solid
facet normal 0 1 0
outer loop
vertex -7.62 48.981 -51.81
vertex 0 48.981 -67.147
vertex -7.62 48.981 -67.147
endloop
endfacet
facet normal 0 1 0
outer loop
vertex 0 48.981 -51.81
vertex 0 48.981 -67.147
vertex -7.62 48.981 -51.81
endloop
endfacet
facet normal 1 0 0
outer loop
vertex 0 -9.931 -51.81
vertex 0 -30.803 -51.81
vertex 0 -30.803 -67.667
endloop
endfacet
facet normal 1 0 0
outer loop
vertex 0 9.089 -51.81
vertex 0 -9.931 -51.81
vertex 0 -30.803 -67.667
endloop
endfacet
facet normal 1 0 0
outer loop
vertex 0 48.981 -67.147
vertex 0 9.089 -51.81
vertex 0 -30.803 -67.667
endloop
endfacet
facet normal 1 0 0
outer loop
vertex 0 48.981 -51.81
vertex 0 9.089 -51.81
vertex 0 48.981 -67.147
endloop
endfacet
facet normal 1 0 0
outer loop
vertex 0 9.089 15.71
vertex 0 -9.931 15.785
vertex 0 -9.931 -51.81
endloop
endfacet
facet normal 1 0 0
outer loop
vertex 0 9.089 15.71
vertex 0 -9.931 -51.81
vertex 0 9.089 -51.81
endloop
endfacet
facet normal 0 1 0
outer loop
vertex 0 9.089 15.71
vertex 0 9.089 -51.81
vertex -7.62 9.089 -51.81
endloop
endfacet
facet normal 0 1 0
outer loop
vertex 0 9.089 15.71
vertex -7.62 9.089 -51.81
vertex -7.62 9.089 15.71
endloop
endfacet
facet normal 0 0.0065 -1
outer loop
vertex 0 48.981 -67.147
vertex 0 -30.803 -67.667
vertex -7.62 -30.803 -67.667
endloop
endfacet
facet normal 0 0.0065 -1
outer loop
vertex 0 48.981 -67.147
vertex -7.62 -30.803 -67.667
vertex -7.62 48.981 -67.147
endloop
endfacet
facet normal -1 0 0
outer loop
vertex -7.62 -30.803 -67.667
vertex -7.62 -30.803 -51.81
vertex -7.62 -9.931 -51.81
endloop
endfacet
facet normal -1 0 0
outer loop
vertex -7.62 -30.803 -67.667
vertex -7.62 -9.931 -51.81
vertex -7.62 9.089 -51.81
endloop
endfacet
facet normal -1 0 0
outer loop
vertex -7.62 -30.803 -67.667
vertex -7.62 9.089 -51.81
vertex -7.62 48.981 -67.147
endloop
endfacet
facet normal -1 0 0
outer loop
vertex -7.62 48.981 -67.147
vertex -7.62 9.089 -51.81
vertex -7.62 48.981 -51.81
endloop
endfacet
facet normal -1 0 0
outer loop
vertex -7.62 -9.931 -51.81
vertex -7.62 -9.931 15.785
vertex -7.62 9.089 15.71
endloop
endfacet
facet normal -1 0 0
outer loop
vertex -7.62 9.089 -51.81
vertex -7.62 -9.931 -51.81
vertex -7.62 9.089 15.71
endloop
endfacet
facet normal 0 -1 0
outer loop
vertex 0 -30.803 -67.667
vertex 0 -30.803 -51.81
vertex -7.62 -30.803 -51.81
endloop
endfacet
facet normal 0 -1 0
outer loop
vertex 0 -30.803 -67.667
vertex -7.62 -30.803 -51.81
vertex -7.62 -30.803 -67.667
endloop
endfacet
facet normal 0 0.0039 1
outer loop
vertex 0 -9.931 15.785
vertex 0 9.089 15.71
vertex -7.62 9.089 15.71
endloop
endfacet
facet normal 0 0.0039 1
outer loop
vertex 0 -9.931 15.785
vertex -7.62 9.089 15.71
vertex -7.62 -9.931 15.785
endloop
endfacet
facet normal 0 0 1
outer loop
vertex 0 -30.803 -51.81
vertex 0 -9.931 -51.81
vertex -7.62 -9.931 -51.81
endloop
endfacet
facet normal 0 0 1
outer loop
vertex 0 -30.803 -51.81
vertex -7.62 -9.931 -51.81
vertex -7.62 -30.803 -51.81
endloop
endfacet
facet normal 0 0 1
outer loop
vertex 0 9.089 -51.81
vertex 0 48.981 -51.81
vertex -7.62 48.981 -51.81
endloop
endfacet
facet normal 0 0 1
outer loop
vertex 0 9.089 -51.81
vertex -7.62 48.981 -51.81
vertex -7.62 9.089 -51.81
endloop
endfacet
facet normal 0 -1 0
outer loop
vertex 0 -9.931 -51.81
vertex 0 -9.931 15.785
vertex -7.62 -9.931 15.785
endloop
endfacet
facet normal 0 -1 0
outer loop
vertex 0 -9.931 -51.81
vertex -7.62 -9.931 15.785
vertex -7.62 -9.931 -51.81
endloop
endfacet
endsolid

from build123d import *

# Parameters (mm, degrees)
F2_DEPTH = 7.62


with BuildPart() as f2:
    # F1 (on Right) → F2 (new body)
    with BuildSketch(Plane.YZ):
        Polygon((-9.930916, 15.784562), (-9.930916, -51.809832), (9.089336, -51.809832), (9.089336, 15.709758), align=None)
        Polygon((-9.930916, -51.809832), (-30.802712, -51.809832), (-30.802712, -67.667425), (48.981383, -67.146659), (48.981383, -51.809832), (9.089336, -51.809832), align=None)
    extrude(amount=-F2_DEPTH)


solid = f2.part
